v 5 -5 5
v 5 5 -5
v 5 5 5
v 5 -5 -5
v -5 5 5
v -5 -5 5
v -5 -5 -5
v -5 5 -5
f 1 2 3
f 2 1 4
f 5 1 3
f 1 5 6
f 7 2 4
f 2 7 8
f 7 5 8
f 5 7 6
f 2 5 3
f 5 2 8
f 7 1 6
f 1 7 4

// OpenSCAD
intersection() {
translate([-6.000000, -6.000000, -6.000000])
cube(size = [12.000000, 12.000000, 12.000000], center = false);
union() {
// Begin.
union() {
rotate([0, -0, 0])
translate([0, 0, 0])
cube(size = [10, 10, 10], center = true);

rotate([0, -0, 0])
translate([0, 0, 0])
cube(size = [10, 10, 10], center = true);
}
// End.
}
}
